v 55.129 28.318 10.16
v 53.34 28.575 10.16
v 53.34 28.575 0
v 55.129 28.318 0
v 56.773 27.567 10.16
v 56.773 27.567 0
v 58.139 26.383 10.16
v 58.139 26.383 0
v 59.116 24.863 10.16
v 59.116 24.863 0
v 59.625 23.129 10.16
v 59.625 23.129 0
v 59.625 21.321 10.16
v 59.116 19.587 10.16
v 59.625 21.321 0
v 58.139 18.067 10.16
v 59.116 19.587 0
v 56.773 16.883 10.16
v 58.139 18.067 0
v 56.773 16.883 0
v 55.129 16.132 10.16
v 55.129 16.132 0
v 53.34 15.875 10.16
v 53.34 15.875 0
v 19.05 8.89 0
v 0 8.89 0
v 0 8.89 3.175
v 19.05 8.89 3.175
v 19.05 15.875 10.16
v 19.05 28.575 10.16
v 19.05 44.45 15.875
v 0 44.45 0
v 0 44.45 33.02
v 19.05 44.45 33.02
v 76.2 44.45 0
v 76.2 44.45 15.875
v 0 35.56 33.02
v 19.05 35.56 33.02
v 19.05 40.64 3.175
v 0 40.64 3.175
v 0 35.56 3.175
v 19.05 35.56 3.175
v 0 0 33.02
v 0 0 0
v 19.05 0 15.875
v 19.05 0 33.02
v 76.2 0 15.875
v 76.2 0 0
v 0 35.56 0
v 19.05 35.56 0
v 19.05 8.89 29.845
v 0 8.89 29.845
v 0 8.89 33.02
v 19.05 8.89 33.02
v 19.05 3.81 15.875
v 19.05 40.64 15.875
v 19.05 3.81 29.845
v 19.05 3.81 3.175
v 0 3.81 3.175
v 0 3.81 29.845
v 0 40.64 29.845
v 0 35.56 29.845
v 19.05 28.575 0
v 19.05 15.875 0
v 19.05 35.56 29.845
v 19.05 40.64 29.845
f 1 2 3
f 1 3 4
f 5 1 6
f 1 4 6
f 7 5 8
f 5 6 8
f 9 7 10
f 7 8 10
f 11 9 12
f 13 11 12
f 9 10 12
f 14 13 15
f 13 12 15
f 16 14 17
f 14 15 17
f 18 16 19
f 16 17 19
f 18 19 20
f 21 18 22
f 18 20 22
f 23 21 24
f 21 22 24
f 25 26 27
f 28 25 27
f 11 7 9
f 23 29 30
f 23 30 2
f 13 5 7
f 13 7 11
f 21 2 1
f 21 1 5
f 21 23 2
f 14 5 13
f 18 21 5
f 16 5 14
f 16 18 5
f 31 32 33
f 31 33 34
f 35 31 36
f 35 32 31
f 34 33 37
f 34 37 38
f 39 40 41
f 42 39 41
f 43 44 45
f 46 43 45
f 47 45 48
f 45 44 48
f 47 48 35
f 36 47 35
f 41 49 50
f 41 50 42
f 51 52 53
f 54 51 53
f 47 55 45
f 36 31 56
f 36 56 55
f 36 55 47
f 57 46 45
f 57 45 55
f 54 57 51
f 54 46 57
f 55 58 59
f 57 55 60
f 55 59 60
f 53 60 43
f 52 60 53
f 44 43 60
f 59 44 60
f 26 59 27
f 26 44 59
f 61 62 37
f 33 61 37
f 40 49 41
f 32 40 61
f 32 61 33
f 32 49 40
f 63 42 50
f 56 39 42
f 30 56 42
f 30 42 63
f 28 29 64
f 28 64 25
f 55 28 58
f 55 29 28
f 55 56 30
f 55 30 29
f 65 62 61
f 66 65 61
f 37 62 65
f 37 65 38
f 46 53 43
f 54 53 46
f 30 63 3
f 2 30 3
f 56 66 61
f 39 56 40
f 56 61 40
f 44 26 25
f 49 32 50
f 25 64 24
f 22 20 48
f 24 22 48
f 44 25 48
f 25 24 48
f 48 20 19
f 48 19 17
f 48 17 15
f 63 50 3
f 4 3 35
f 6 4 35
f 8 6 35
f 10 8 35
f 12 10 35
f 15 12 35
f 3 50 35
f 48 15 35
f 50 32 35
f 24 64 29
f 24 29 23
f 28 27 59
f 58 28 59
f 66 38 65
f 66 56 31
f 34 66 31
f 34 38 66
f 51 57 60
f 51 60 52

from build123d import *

# Parameters (mm, degrees)
F0_W     = 76.2
F0_H     = 44.45
F1_DEPTH = 33.02
F2_W     = 57.15
F2_H     = 44.45
F3_DEPTH = 17.145
F4_W     = 26.67
F4_H     = 3.175
F5_DEPTH = 19.05
F6_W     = 34.29
F6_H     = 12.7
F7_DEPTH = 10.16


with BuildPart() as f1:
    # F0 (on Top) → F1 (new body)
    with BuildSketch(Plane.XY):
        with Locations((38.1, 22.225)):
            Rectangle(F0_W, F0_H)
    extrude(amount=F1_DEPTH)

    # F2 (on face) → F3 (cut)
    with BuildSketch(Plane.XY.offset(33.02)):
        with Locations((47.625, 22.225)):
            Rectangle(F2_W, F2_H)
    extrude(amount=-F3_DEPTH, mode=Mode.SUBTRACT)

    # F4 (on face) → F5 (cut)
    with BuildSketch(Plane(origin=(0, 0, 0), x_dir=(0, -1, 0), z_dir=(-1, 0, 0))):
        Polygon((-35.56, 29.845), (-40.64, 29.845), (-40.64, 3.175), (-35.56, 3.175), (-8.89, 3.175), (-3.81, 3.175), (-3.81, 29.845), (-8.89, 29.845), align=None)
        with Locations((-22.225, 31.4325)):
            Rectangle(F4_W, F4_H)
        with Locations((-22.225, 1.5875)):
            Rectangle(F4_W, F4_H)
    extrude(amount=-F5_DEPTH, mode=Mode.SUBTRACT)

    # F6 (on face) → F7 (cut)
    with BuildSketch(Plane(origin=(0, 0, 0), x_dir=(1, 0, 0), z_dir=(0, 0, -1))):
        with BuildLine():
            ThreePointArc((53.34, -28.575), (59.69, -22.225), (53.34, -15.875))
            Line((53.34, -15.875), (53.34, -28.575))
        make_face()
        with Locations((36.195, -22.225)):
            Rectangle(F6_W, F6_H)
    extrude(amount=-F7_DEPTH, mode=Mode.SUBTRACT)


solid = f1.part
